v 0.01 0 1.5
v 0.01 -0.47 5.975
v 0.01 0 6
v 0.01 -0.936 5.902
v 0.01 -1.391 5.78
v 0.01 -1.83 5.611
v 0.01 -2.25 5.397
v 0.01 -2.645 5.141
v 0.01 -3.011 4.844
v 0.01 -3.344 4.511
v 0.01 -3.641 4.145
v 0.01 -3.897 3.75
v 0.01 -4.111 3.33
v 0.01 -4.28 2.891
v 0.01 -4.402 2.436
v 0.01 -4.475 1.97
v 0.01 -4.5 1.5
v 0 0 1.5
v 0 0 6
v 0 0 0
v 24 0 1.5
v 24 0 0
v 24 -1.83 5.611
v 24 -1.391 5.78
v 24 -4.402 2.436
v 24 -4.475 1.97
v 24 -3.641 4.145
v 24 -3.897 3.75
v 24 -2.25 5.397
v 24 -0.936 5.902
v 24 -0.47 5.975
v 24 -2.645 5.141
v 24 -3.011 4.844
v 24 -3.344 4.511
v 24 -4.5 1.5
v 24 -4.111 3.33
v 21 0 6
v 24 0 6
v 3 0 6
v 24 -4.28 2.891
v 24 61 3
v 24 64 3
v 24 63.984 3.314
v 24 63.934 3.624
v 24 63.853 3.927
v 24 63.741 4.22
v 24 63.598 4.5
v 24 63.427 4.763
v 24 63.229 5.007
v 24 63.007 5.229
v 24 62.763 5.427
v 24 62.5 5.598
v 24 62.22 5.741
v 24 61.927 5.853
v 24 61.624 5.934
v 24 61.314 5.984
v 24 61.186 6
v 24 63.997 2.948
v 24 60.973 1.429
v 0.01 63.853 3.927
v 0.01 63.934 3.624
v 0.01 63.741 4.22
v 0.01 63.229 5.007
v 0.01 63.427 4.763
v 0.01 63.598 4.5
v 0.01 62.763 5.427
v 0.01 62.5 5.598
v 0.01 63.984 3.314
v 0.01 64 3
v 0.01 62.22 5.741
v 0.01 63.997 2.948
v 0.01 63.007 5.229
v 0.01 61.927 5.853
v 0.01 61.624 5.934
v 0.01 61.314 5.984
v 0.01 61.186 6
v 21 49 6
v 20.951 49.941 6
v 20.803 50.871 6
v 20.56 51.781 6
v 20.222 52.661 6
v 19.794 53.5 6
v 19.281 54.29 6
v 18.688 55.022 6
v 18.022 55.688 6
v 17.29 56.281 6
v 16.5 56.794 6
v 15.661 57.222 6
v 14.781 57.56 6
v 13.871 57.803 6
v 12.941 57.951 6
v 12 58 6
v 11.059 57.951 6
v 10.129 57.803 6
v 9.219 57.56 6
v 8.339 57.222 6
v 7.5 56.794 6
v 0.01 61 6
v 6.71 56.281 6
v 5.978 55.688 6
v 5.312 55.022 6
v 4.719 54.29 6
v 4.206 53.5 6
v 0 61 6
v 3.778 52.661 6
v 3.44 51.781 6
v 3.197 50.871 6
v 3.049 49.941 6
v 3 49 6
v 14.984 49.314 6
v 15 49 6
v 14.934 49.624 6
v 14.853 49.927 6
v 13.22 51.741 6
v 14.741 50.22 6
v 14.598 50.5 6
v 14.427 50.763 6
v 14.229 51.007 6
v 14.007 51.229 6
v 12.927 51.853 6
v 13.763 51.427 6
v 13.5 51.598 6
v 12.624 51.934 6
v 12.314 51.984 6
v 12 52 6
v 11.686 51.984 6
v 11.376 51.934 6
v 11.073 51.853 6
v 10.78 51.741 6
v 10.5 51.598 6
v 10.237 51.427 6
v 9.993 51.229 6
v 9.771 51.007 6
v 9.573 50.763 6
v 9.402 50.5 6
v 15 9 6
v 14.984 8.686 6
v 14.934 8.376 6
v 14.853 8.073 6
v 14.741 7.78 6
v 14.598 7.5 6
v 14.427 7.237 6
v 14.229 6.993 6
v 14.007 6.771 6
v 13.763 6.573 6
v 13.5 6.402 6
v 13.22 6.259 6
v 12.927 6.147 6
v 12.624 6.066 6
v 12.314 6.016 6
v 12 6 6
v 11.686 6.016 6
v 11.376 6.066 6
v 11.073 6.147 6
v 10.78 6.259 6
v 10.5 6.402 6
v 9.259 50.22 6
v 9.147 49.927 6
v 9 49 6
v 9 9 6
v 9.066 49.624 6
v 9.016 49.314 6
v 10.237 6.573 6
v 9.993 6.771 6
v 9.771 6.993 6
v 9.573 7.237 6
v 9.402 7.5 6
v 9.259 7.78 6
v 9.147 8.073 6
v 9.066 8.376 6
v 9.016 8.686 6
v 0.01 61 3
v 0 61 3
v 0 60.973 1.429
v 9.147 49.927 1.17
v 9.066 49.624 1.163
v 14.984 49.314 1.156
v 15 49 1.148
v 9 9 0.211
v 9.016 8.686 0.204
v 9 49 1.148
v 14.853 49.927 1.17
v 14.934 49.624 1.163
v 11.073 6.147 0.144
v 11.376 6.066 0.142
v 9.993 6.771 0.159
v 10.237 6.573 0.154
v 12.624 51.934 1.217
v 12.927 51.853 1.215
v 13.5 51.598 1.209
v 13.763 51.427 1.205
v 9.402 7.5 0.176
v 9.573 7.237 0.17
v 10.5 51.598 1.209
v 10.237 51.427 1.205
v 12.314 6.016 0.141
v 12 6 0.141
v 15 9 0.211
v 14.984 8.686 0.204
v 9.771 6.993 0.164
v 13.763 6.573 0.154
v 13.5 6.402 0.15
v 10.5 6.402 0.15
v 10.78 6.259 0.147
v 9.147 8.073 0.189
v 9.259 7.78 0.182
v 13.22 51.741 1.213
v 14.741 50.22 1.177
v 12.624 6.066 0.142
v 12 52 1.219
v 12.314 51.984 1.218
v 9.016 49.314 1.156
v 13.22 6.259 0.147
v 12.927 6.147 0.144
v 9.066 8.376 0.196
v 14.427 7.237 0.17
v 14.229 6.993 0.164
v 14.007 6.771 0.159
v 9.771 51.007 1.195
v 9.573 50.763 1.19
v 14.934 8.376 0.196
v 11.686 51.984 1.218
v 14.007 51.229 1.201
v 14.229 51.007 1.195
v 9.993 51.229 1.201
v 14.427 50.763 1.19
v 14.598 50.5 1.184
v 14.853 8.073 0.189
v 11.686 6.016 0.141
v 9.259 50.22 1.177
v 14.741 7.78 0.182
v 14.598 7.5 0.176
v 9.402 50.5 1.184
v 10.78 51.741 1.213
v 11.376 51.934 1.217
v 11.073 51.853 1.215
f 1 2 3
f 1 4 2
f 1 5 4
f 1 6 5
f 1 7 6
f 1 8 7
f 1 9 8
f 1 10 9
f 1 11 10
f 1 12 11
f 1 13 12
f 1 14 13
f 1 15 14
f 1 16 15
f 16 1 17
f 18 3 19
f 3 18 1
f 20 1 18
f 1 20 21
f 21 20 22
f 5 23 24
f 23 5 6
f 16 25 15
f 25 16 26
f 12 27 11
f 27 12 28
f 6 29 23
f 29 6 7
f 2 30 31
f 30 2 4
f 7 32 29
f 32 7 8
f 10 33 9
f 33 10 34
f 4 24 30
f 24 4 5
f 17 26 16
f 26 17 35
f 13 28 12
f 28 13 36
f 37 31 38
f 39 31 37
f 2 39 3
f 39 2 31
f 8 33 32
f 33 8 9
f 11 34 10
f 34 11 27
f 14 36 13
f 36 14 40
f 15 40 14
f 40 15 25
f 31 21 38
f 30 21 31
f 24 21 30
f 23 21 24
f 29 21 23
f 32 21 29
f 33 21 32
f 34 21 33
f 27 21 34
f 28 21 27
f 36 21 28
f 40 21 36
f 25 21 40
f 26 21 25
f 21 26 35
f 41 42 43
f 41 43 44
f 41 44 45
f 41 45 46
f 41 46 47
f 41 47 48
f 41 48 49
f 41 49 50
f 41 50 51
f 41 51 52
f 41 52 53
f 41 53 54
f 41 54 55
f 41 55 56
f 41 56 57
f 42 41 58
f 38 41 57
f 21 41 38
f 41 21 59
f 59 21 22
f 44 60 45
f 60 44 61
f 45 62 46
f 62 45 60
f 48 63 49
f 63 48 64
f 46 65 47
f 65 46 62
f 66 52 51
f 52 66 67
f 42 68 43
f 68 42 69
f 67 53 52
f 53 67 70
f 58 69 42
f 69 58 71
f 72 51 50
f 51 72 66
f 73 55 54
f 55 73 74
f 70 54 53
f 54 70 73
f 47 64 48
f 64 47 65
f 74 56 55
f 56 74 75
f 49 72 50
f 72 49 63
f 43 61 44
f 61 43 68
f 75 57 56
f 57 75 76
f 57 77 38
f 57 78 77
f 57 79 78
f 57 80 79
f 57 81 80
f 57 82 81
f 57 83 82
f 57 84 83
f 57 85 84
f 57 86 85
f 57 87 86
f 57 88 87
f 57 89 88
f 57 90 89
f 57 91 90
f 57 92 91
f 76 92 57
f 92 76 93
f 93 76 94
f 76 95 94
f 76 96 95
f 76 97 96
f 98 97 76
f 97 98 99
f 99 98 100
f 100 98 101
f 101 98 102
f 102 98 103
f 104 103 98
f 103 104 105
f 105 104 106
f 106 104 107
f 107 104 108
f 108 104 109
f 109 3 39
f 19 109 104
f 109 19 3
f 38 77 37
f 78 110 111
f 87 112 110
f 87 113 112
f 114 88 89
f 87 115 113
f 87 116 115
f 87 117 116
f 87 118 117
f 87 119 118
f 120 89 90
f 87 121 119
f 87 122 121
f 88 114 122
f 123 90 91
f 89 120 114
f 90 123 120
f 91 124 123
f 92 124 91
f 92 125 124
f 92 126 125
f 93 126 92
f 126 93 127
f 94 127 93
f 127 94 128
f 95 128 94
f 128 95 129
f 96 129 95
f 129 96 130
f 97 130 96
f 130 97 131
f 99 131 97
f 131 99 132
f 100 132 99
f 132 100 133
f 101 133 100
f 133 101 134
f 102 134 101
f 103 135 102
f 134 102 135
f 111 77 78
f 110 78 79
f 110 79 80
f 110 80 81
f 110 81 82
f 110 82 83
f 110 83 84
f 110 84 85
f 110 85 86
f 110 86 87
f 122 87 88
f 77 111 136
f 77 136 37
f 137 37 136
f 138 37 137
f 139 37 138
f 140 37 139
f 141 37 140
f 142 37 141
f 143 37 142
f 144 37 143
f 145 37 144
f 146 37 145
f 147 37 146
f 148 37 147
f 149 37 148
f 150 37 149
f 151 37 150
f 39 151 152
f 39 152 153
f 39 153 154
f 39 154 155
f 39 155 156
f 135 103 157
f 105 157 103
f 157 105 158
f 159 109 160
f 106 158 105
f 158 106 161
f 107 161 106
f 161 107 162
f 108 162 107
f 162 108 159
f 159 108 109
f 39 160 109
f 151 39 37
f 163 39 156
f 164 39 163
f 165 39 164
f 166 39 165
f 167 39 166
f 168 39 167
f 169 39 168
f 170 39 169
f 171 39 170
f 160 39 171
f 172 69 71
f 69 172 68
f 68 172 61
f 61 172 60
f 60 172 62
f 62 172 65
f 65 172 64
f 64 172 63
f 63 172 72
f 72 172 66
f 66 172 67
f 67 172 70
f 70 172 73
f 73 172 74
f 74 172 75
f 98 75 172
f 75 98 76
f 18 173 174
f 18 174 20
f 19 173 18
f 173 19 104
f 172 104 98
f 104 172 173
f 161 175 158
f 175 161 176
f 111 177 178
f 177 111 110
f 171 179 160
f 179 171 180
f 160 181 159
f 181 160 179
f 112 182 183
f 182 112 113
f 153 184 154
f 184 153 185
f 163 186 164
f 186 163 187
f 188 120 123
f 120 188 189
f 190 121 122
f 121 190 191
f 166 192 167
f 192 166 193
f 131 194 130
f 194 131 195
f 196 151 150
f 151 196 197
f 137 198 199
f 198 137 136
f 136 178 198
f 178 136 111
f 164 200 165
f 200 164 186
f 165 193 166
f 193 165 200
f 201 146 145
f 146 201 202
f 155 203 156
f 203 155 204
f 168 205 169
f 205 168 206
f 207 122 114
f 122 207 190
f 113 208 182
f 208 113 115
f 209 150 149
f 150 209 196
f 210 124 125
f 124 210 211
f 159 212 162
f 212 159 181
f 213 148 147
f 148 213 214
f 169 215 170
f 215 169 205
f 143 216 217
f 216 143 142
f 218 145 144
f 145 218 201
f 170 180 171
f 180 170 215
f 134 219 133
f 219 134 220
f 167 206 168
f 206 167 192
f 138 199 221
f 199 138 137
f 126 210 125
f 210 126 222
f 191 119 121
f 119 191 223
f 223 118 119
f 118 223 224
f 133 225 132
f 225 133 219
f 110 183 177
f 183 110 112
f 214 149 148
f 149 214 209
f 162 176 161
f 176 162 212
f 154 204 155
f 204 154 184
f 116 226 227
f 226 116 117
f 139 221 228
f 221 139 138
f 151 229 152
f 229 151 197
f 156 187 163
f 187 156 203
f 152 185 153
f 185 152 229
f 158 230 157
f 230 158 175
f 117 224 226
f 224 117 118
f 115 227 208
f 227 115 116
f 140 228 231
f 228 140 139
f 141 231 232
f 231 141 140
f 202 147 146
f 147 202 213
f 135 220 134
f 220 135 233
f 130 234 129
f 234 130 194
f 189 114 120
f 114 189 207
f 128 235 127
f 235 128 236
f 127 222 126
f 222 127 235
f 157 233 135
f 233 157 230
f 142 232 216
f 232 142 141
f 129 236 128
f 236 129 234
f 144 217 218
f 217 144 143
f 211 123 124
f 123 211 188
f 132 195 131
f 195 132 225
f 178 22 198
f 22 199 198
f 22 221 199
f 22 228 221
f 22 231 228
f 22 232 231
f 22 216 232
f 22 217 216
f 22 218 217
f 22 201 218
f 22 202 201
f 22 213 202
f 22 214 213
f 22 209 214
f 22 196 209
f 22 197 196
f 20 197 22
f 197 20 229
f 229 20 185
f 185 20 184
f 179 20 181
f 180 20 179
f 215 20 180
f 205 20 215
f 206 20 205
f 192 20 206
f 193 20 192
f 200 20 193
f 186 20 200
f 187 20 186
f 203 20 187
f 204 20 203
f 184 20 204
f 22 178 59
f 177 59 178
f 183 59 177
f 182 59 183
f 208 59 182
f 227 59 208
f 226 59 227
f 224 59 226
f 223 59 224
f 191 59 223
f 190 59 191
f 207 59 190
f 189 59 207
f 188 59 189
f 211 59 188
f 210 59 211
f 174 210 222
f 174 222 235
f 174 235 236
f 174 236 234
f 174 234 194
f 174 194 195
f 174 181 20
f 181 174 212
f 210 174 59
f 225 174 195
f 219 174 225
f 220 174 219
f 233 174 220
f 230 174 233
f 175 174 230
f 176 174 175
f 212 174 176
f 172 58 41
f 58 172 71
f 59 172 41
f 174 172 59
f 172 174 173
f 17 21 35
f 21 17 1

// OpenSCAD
/* [CNC hold down] */
// Length of bolt cutout (mm)
Bolt_Cutout_Length = 40;
// Diameter Length of bolt cutout (mm)
Bolt_Cutout_Diameter = 6;
// Clearance around the bolt head (mm), default = Bolt_Cutout_Diamater
Bolt_Clearance = 0;
// Thickness of the front and side walls (mm)
Wall_Thickness = 3;
//Thickness of the base(mm), Default = Wall_Thickness*2
Base_Thickness = 0;
// Back relief on base (mm), default = Wall_Thickness/2
Base_Relief = 0;

/* [Front Lip] */
// Radius of front lip (mm), default = Wall_Thickness
Front_Radius = 0;
// Length of front lip (mm), default = Front_Radius
Front_Lip_Length = 0;
// Height of front lip (mm), default = Front_Radius
Front_Height = 0;
// Relief on front (deg)
Front_Relief_Angle = 1;
//Front wall thickness (mm), default = Wall_Thickness
Front_Wall_Thickness = 0;
// The full height length (mm), default = half length
Support_Length = 0;
// The full Length height (mm) , default = quater height
Support_Height = 0;

/* [Back Lip] */
// Radius of back lip, default = Base_Thickness*3/4
Back_Radius = 0;
// Extend length of back lip
Back_Lip_Length = 0;

/* [Hidden] */
fudge = 0.01;
$fn = 60;

boltCutoutLength = Bolt_Cutout_Length;
boltCutoutDiameter = Bolt_Cutout_Diameter;
boltClearance = Bolt_Clearance;
wallThickness = Wall_Thickness;
frontWallThickness = Front_Wall_Thickness == 0 ? wallThickness : Front_Wall_Thickness;

boltReliefDiameter = boltClearance == 0 ? boltCutoutDiameter*3 : boltClearance*2 + boltCutoutDiameter;
baseLength = boltCutoutLength + boltReliefDiameter + frontWallThickness;
baseThickness = Base_Thickness ==0 ? wallThickness*2 : Base_Thickness;
baseRelief = Base_Relief == 0 ? baseThickness/4 : Base_Relief;
width = boltReliefDiameter + wallThickness * 2;

frontRadius = Front_Radius == 0 ? wallThickness : Front_Radius;
frontLipLength = Front_Lip_Length == 0 ? frontRadius : Front_Lip_Length;
frontReliefAngle = Front_Relief_Angle;
frontHeight = Front_Height < baseThickness/2 ? baseThickness/ 2 : Front_Height;
supportLength = Support_Length == 0 ? baseLength/2 :
                Support_Length > baseLength ? baseLength : Support_Length;
supportHeight = Support_Height == 0 ? frontHeight /4 :
                Support_Height > frontHeight ? frontHeight : Support_Height;

backRadius = Back_Radius == 0 ? baseThickness*3/4 : Back_Radius;
backLipLength = Back_Lip_Length;

difference() {
  union () {
    //base
    cube([width,  baseLength, baseThickness]);

    //Back lip
    intersection() {
      translate([fudge, -(backRadius+backLipLength), 0])
        cube([width + fudge * 2, backRadius+backLipLength, baseThickness ]);
      
      union () {
        translate([0, -backLipLength, baseThickness - backRadius])
          cube([width + fudge * 2, backLipLength, backRadius]);
         translate([0, -backLipLength, baseThickness - backRadius])
            rotate([0,90])
            cylinder(width,r = backRadius);
      }
    }
    
    //Front lip
    intersection() {
      translate([fudge, 0, 0])
        cube([width + fudge * 2, baseLength+Front_Lip_Length+frontRadius, frontHeight+frontRadius]);
      union(){
        hull() {
          //front lip
          translate([0, baseLength+Front_Lip_Length, frontHeight])
            rotate([0,90])
            cylinder(width,r = frontRadius);

          translate([0, baseLength, frontHeight])
            rotate([0,90])
            cylinder(width,r = frontRadius);
          
          // back height sholder 
          translate([0, baseLength - frontRadius - frontWallThickness, frontHeight-(frontRadius*1.1)])
            rotate([0,90])
            cylinder(width,r = frontRadius*2);
          
          translate([0, baseLength, baseThickness/2])
            rotate([0,90])
            cylinder(width,d = baseThickness);
          
          translate([0, baseLength - supportLength, baseThickness/2])
            rotate([0,90])
            cylinder(width,d = baseThickness);
        }
        
        hull() {
          // back length sholder 
          translate([0, baseLength - frontRadius*2, supportHeight])
            rotate([0,90])
            cylinder(width,r = frontRadius*2);
                  
          translate([0, 0, baseThickness/2])
            rotate([0,90])
            cylinder(width,d = baseThickness);
          
          translate([0, baseLength, baseThickness/2])
            rotate([0,90])
            cylinder(width,d = baseThickness);
        }
      }
    }
  }
  
  //Bolt cutout 
  translate([width/2, boltReliefDiameter/2, -fudge])
  hull(){
    cylinder(baseThickness*2 + fudge*2,d = boltCutoutDiameter);
    
    translate([0, boltCutoutLength, 0])
      cylinder(baseThickness*2 + fudge*2,d = boltCutoutDiameter);
  }
  
  //Bolt Clearance relief
  union(){
   translate([width/2, boltCutoutLength+boltReliefDiameter/2, baseThickness])
     cylinder(baseThickness+frontHeight,d = boltReliefDiameter);
    
    translate([wallThickness, 0, baseThickness])
      cube([boltReliefDiameter, boltCutoutLength+boltReliefDiameter/2, baseThickness+frontHeight]);
  }
  
  /*
  //base relief
  *rotate([1,0])
     translate([-fudge, 0, -baseThickness])
     cube([width + fudge*2, length+frontRadius+Front_Lip_Length, baseThickness]);
  */
  
  //base relief
  translate([-fudge, 0, 0])
    rotate([0,90])
    linear_extrude(width + fudge*2) {
      //Consider making this a more complex shape
      polygon([
        [0,0],
        [fudge,fudge],
        [fudge,baseLength+frontRadius+Front_Lip_Length],
        [-baseRelief,baseLength+frontRadius+Front_Lip_Length]]);
   }


  //front relief
  translate([-fudge, baseLength, -baseThickness])
    rotate_about_pt([frontReliefAngle*-1,0],[0,0,frontHeight+baseThickness])
     cube([width + fudge*2, baseLength, frontHeight+baseThickness]);

  /*
  //front relief
  *translate([-fudge, length, baseThickness+frontHeight-fudge])
    rotate([0,90])
    linear_extrude(width + fudge*2) {
      //Consider making this a more complex shape
      polygon([
        [0,0],
        [0,frontRadius+Front_Lip_Length],
        [frontHeight+fudge,frontRadius+Front_Lip_Length],
        [frontHeight+fudge,-frontRelief],
        ]);
     }
  */
  
  //back relief 
  translate([-fudge, -(backRadius+backLipLength+fudge), -fudge])
    cube([width + fudge*2, backRadius+backLipLength+fudge, baseThickness - backRadius+fudge]);
}

module Log(width, diameter) {
  rotate([0,90])
    cylinder(width,d = diameter);
}

module translate_yz(y, z) {
  translate([0,y,z])
    children();
}

// rotate as per a, v, but around point pt
module rotate_about_pt(r, pt) {
    translate(pt)
        rotate(r) // CHANGE HERE
            translate(-pt)
                children();
}
